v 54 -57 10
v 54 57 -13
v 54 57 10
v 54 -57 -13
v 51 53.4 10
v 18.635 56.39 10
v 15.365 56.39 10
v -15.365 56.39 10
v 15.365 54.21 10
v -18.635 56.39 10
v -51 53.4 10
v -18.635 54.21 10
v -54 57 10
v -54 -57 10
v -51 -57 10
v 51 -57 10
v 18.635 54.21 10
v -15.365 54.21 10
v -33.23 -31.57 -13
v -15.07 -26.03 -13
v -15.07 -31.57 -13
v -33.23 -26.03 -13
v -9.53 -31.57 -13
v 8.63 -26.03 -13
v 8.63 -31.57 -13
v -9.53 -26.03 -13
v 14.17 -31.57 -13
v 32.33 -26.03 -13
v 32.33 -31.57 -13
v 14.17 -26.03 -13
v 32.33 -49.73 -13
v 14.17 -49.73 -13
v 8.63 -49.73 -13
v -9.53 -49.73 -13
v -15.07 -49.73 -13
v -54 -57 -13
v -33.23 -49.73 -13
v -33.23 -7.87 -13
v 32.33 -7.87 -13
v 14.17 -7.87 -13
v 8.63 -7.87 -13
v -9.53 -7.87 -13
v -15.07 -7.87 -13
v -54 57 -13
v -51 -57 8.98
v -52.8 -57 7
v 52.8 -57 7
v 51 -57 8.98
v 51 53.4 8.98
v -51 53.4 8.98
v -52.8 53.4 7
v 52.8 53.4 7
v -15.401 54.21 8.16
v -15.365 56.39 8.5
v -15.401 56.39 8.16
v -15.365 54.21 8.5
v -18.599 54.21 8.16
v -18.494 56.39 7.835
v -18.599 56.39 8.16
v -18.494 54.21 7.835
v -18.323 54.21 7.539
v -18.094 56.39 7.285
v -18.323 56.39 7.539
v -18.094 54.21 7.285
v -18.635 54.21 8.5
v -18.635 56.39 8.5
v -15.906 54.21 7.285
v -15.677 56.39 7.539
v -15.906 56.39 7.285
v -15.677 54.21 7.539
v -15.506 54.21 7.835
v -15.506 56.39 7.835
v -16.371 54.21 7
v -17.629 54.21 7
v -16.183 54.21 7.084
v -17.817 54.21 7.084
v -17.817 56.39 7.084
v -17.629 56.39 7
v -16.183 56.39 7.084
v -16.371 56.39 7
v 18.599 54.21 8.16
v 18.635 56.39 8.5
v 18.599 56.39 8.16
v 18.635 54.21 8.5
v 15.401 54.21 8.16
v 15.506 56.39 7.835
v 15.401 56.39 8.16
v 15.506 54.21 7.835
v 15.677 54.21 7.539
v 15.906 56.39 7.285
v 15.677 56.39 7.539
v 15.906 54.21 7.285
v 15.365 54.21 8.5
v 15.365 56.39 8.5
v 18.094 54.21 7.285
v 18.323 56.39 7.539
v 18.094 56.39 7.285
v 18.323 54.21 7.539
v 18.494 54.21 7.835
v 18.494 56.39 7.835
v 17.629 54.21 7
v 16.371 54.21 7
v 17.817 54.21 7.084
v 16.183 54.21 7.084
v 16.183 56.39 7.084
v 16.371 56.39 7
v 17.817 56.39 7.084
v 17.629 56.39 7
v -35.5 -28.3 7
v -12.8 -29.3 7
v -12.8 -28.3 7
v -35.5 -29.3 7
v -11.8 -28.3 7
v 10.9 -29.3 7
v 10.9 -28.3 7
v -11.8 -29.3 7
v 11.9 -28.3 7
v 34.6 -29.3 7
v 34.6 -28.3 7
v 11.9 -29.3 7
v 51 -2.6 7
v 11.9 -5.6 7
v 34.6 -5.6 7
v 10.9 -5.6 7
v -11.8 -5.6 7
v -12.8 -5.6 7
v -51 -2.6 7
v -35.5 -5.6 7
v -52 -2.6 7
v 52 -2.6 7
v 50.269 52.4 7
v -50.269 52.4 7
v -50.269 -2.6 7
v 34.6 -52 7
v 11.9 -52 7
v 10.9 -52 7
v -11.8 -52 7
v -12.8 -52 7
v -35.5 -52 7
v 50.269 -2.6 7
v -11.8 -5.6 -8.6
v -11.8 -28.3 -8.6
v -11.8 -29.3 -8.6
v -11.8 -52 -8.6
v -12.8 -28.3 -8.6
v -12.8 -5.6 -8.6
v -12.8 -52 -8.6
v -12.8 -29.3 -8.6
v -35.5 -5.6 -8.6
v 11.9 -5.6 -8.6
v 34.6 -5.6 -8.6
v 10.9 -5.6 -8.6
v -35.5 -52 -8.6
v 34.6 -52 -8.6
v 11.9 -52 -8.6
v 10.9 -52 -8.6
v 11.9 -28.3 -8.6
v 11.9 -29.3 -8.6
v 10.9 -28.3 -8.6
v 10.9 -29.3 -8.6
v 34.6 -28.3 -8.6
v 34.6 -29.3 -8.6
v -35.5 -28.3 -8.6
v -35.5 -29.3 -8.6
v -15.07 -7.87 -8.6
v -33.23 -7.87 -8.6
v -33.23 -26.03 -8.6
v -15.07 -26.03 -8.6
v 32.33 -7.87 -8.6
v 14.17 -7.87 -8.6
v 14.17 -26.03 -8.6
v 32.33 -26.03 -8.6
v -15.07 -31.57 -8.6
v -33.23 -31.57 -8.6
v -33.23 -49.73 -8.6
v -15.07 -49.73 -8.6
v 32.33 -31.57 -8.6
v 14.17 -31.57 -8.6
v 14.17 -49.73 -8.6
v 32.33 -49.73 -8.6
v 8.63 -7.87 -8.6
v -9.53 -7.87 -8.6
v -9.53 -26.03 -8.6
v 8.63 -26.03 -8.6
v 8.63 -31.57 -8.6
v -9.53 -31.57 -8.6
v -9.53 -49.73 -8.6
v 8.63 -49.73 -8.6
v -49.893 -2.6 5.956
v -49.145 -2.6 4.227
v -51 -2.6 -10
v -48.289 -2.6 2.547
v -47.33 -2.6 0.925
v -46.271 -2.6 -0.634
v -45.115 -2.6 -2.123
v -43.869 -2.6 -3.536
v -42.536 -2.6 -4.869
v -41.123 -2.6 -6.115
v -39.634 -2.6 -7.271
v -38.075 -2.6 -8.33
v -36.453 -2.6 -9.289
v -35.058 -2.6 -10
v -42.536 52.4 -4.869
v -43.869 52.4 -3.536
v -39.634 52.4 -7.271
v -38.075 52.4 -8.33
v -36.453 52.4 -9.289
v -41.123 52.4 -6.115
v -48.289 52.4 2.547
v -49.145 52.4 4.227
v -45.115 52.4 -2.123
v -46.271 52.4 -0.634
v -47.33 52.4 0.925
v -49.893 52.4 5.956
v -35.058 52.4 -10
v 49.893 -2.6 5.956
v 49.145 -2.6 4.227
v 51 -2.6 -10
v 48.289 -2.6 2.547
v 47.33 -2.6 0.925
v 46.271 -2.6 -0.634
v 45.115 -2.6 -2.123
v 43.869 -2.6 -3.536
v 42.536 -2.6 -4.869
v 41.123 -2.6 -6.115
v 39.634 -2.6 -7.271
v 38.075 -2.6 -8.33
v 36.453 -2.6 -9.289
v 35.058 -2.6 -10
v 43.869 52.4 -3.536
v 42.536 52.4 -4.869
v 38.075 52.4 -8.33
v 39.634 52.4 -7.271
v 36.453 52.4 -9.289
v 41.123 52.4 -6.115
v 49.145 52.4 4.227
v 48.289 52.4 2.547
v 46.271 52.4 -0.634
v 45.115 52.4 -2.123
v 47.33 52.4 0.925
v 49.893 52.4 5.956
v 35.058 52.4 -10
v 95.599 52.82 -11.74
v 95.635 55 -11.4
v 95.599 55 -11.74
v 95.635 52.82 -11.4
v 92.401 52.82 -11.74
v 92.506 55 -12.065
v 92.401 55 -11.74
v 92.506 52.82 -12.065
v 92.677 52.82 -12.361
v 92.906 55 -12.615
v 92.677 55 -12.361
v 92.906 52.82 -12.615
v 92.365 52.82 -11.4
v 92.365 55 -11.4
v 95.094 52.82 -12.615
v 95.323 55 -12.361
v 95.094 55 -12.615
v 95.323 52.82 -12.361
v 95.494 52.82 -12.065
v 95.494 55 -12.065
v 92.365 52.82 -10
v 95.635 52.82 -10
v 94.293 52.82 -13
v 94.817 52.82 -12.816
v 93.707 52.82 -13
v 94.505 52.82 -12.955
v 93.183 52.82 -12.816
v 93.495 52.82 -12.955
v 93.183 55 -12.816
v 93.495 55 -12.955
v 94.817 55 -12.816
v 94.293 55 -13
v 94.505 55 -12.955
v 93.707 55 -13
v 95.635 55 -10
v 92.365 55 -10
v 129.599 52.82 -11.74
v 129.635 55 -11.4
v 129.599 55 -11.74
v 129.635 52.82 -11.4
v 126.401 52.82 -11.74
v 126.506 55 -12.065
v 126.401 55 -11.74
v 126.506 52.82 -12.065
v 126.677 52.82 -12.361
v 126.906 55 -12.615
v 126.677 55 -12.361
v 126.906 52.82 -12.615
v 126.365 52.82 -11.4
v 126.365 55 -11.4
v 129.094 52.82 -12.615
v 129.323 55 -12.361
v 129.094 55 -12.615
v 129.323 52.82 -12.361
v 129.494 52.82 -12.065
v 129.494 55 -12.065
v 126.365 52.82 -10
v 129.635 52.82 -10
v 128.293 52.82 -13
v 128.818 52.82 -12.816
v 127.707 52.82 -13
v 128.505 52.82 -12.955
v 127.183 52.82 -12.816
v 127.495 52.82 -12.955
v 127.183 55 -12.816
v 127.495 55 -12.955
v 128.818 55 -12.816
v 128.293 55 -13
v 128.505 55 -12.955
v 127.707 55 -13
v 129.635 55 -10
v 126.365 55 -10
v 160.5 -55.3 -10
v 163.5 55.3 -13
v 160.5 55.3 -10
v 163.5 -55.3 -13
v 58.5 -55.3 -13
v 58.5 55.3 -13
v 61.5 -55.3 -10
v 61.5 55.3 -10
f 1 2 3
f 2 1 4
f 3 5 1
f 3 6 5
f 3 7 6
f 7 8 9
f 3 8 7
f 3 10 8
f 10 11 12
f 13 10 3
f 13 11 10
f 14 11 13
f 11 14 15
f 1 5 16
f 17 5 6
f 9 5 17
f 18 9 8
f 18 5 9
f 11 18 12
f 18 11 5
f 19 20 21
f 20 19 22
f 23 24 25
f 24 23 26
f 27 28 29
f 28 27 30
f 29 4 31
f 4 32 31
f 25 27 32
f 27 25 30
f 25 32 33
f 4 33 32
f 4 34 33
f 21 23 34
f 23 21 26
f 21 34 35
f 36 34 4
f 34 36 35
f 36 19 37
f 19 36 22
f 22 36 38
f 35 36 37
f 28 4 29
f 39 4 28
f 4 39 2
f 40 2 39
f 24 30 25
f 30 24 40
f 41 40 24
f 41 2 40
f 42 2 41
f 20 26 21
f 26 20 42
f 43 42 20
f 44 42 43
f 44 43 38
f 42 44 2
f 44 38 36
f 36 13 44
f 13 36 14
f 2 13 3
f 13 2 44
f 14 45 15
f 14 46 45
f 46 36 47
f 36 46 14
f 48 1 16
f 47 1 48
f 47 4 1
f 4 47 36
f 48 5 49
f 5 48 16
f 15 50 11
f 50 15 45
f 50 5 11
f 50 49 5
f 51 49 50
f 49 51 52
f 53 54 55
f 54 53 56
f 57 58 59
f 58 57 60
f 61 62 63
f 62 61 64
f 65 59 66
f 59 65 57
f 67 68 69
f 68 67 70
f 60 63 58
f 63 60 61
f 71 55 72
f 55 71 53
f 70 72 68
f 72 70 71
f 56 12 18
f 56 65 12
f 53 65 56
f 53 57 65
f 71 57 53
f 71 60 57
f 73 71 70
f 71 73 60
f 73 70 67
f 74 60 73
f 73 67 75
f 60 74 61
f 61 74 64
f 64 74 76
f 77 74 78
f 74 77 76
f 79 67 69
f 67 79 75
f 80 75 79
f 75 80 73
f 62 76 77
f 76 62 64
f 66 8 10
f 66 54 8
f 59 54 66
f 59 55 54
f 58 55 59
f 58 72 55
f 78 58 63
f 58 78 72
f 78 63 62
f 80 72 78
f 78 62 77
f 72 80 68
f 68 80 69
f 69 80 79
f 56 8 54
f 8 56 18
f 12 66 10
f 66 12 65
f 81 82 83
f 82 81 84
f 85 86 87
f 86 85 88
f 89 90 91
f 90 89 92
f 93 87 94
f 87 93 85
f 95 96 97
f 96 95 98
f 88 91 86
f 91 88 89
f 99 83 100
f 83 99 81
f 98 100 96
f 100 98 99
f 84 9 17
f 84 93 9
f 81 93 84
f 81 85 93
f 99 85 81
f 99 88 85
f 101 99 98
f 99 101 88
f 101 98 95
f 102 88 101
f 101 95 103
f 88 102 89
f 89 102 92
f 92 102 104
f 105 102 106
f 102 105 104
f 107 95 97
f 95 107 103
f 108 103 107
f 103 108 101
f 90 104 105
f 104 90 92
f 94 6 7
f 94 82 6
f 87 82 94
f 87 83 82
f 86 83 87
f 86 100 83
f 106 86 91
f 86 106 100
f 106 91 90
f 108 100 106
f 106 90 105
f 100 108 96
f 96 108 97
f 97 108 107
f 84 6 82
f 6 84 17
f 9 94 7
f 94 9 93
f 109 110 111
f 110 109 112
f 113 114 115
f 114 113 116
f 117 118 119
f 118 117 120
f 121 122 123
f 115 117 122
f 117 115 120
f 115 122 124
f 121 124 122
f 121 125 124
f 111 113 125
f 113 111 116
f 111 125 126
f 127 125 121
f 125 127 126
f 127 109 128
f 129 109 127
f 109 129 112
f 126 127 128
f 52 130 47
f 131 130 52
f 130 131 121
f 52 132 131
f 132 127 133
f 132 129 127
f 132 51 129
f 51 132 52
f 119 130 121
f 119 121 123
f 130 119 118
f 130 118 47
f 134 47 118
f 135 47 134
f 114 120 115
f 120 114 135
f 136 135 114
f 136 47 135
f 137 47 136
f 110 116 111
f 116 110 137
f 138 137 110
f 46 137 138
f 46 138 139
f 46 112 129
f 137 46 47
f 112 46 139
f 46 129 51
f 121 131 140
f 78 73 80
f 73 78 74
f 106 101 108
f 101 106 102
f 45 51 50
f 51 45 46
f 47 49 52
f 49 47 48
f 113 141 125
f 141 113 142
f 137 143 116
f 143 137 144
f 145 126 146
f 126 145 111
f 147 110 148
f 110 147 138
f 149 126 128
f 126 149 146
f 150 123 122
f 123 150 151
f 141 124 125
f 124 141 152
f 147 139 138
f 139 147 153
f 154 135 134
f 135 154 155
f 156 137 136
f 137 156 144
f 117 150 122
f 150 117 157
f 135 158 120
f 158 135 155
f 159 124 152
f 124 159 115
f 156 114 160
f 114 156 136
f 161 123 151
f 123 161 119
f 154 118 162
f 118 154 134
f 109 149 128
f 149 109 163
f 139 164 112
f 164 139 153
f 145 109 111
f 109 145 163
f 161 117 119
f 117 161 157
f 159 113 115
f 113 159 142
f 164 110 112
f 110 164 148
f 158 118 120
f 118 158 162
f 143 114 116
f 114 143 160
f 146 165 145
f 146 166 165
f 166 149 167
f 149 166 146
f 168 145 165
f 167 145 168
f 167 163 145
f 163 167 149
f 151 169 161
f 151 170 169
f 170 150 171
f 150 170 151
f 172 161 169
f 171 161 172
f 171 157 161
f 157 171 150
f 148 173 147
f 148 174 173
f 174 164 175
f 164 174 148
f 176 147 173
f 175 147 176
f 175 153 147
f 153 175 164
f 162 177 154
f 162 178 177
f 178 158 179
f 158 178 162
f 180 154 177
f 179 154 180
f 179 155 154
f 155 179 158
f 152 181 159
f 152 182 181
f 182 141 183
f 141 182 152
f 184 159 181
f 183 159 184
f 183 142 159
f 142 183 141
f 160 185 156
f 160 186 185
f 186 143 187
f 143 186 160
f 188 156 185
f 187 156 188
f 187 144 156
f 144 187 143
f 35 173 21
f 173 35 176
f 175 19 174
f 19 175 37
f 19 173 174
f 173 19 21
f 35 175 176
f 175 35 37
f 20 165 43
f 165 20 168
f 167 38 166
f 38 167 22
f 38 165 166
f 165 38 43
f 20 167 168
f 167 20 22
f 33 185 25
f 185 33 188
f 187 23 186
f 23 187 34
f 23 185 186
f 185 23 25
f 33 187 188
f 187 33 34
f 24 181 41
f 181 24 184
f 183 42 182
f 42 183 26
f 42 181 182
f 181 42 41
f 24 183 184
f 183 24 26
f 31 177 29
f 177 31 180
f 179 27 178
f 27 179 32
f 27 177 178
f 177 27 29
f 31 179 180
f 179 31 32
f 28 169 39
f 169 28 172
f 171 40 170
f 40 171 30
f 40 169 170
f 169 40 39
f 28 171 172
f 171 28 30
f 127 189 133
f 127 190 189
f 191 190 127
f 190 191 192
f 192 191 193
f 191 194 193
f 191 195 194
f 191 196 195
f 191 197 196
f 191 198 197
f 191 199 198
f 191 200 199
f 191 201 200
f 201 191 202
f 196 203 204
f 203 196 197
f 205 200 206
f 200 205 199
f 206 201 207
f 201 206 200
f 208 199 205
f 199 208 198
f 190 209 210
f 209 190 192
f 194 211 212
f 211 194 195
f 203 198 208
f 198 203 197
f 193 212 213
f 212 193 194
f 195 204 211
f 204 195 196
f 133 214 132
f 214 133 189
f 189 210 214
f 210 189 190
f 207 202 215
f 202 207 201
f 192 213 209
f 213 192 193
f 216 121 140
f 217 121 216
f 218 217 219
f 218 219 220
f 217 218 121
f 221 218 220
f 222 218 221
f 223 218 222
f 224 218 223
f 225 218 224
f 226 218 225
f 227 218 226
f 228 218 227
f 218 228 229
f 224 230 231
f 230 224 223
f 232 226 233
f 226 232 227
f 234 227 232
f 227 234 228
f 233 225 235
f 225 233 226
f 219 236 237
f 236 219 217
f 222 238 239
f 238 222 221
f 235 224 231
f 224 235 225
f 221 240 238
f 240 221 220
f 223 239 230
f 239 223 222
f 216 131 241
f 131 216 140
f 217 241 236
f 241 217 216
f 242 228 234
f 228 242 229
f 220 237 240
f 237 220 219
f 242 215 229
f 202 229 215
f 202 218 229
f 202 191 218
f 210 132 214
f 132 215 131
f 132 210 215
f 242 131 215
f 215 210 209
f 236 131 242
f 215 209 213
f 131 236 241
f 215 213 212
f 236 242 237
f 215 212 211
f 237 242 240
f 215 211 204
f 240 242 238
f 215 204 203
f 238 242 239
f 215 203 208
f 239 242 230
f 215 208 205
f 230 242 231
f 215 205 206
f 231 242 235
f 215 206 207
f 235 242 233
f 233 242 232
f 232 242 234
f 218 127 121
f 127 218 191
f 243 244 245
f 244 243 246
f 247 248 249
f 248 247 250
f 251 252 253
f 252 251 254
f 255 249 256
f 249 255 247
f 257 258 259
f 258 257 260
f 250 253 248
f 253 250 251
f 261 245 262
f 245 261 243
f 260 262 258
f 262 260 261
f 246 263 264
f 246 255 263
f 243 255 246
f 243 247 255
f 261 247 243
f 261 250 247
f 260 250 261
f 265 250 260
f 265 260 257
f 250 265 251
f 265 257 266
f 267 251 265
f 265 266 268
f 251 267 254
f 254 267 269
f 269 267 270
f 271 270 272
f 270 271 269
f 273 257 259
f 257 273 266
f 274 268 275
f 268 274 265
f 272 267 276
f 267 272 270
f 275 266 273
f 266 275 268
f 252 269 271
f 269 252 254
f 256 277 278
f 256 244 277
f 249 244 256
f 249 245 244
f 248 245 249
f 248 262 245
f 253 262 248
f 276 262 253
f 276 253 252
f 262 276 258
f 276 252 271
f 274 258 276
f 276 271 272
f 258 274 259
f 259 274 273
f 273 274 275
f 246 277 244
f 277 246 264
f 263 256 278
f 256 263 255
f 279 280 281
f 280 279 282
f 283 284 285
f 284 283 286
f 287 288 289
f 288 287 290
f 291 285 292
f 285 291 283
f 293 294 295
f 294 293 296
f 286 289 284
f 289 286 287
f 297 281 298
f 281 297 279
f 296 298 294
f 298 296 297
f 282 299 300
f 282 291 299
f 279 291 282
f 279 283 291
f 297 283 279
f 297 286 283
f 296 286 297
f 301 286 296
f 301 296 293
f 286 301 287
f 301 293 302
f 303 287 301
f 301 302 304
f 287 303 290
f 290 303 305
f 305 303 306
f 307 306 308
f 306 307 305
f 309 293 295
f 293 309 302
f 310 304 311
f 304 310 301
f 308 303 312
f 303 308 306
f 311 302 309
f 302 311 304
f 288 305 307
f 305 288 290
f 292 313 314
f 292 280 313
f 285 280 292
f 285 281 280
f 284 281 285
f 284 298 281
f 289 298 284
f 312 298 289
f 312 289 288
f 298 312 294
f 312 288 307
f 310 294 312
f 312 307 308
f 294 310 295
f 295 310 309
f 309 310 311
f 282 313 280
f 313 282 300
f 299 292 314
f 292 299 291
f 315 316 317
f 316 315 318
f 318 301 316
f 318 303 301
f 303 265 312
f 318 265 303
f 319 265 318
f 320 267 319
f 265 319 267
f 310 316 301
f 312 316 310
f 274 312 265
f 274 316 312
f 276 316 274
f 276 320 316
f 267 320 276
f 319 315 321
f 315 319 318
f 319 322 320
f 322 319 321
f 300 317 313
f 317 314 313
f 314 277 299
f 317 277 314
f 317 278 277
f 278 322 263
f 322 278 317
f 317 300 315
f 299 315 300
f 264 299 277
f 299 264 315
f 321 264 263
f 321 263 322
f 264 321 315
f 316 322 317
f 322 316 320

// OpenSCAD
//insert_height = 20;
//insert_width = 110;
//insert_depth = 116;

include <../../box.scad>

internal_dimensions = [108, 114, 20];
box_internals = [internal_dimensions.x - wall_width*2, internal_dimensions.y - wall_width - back_wall_width, internal_dimensions.z];

module box_internals()
{
	include <scout_tiles_internals2.scad>
}


union()
{
	box(box_internals, enable_fillet=false, enable_floor=false, num_slots = 2);
	
	translate([0,0,-wall_width])
	translate(-internal_dimensions/2)
	box_internals();
}

neighbouring_lid(box_internals, num_slots = 2, label = "Scout tiles");
